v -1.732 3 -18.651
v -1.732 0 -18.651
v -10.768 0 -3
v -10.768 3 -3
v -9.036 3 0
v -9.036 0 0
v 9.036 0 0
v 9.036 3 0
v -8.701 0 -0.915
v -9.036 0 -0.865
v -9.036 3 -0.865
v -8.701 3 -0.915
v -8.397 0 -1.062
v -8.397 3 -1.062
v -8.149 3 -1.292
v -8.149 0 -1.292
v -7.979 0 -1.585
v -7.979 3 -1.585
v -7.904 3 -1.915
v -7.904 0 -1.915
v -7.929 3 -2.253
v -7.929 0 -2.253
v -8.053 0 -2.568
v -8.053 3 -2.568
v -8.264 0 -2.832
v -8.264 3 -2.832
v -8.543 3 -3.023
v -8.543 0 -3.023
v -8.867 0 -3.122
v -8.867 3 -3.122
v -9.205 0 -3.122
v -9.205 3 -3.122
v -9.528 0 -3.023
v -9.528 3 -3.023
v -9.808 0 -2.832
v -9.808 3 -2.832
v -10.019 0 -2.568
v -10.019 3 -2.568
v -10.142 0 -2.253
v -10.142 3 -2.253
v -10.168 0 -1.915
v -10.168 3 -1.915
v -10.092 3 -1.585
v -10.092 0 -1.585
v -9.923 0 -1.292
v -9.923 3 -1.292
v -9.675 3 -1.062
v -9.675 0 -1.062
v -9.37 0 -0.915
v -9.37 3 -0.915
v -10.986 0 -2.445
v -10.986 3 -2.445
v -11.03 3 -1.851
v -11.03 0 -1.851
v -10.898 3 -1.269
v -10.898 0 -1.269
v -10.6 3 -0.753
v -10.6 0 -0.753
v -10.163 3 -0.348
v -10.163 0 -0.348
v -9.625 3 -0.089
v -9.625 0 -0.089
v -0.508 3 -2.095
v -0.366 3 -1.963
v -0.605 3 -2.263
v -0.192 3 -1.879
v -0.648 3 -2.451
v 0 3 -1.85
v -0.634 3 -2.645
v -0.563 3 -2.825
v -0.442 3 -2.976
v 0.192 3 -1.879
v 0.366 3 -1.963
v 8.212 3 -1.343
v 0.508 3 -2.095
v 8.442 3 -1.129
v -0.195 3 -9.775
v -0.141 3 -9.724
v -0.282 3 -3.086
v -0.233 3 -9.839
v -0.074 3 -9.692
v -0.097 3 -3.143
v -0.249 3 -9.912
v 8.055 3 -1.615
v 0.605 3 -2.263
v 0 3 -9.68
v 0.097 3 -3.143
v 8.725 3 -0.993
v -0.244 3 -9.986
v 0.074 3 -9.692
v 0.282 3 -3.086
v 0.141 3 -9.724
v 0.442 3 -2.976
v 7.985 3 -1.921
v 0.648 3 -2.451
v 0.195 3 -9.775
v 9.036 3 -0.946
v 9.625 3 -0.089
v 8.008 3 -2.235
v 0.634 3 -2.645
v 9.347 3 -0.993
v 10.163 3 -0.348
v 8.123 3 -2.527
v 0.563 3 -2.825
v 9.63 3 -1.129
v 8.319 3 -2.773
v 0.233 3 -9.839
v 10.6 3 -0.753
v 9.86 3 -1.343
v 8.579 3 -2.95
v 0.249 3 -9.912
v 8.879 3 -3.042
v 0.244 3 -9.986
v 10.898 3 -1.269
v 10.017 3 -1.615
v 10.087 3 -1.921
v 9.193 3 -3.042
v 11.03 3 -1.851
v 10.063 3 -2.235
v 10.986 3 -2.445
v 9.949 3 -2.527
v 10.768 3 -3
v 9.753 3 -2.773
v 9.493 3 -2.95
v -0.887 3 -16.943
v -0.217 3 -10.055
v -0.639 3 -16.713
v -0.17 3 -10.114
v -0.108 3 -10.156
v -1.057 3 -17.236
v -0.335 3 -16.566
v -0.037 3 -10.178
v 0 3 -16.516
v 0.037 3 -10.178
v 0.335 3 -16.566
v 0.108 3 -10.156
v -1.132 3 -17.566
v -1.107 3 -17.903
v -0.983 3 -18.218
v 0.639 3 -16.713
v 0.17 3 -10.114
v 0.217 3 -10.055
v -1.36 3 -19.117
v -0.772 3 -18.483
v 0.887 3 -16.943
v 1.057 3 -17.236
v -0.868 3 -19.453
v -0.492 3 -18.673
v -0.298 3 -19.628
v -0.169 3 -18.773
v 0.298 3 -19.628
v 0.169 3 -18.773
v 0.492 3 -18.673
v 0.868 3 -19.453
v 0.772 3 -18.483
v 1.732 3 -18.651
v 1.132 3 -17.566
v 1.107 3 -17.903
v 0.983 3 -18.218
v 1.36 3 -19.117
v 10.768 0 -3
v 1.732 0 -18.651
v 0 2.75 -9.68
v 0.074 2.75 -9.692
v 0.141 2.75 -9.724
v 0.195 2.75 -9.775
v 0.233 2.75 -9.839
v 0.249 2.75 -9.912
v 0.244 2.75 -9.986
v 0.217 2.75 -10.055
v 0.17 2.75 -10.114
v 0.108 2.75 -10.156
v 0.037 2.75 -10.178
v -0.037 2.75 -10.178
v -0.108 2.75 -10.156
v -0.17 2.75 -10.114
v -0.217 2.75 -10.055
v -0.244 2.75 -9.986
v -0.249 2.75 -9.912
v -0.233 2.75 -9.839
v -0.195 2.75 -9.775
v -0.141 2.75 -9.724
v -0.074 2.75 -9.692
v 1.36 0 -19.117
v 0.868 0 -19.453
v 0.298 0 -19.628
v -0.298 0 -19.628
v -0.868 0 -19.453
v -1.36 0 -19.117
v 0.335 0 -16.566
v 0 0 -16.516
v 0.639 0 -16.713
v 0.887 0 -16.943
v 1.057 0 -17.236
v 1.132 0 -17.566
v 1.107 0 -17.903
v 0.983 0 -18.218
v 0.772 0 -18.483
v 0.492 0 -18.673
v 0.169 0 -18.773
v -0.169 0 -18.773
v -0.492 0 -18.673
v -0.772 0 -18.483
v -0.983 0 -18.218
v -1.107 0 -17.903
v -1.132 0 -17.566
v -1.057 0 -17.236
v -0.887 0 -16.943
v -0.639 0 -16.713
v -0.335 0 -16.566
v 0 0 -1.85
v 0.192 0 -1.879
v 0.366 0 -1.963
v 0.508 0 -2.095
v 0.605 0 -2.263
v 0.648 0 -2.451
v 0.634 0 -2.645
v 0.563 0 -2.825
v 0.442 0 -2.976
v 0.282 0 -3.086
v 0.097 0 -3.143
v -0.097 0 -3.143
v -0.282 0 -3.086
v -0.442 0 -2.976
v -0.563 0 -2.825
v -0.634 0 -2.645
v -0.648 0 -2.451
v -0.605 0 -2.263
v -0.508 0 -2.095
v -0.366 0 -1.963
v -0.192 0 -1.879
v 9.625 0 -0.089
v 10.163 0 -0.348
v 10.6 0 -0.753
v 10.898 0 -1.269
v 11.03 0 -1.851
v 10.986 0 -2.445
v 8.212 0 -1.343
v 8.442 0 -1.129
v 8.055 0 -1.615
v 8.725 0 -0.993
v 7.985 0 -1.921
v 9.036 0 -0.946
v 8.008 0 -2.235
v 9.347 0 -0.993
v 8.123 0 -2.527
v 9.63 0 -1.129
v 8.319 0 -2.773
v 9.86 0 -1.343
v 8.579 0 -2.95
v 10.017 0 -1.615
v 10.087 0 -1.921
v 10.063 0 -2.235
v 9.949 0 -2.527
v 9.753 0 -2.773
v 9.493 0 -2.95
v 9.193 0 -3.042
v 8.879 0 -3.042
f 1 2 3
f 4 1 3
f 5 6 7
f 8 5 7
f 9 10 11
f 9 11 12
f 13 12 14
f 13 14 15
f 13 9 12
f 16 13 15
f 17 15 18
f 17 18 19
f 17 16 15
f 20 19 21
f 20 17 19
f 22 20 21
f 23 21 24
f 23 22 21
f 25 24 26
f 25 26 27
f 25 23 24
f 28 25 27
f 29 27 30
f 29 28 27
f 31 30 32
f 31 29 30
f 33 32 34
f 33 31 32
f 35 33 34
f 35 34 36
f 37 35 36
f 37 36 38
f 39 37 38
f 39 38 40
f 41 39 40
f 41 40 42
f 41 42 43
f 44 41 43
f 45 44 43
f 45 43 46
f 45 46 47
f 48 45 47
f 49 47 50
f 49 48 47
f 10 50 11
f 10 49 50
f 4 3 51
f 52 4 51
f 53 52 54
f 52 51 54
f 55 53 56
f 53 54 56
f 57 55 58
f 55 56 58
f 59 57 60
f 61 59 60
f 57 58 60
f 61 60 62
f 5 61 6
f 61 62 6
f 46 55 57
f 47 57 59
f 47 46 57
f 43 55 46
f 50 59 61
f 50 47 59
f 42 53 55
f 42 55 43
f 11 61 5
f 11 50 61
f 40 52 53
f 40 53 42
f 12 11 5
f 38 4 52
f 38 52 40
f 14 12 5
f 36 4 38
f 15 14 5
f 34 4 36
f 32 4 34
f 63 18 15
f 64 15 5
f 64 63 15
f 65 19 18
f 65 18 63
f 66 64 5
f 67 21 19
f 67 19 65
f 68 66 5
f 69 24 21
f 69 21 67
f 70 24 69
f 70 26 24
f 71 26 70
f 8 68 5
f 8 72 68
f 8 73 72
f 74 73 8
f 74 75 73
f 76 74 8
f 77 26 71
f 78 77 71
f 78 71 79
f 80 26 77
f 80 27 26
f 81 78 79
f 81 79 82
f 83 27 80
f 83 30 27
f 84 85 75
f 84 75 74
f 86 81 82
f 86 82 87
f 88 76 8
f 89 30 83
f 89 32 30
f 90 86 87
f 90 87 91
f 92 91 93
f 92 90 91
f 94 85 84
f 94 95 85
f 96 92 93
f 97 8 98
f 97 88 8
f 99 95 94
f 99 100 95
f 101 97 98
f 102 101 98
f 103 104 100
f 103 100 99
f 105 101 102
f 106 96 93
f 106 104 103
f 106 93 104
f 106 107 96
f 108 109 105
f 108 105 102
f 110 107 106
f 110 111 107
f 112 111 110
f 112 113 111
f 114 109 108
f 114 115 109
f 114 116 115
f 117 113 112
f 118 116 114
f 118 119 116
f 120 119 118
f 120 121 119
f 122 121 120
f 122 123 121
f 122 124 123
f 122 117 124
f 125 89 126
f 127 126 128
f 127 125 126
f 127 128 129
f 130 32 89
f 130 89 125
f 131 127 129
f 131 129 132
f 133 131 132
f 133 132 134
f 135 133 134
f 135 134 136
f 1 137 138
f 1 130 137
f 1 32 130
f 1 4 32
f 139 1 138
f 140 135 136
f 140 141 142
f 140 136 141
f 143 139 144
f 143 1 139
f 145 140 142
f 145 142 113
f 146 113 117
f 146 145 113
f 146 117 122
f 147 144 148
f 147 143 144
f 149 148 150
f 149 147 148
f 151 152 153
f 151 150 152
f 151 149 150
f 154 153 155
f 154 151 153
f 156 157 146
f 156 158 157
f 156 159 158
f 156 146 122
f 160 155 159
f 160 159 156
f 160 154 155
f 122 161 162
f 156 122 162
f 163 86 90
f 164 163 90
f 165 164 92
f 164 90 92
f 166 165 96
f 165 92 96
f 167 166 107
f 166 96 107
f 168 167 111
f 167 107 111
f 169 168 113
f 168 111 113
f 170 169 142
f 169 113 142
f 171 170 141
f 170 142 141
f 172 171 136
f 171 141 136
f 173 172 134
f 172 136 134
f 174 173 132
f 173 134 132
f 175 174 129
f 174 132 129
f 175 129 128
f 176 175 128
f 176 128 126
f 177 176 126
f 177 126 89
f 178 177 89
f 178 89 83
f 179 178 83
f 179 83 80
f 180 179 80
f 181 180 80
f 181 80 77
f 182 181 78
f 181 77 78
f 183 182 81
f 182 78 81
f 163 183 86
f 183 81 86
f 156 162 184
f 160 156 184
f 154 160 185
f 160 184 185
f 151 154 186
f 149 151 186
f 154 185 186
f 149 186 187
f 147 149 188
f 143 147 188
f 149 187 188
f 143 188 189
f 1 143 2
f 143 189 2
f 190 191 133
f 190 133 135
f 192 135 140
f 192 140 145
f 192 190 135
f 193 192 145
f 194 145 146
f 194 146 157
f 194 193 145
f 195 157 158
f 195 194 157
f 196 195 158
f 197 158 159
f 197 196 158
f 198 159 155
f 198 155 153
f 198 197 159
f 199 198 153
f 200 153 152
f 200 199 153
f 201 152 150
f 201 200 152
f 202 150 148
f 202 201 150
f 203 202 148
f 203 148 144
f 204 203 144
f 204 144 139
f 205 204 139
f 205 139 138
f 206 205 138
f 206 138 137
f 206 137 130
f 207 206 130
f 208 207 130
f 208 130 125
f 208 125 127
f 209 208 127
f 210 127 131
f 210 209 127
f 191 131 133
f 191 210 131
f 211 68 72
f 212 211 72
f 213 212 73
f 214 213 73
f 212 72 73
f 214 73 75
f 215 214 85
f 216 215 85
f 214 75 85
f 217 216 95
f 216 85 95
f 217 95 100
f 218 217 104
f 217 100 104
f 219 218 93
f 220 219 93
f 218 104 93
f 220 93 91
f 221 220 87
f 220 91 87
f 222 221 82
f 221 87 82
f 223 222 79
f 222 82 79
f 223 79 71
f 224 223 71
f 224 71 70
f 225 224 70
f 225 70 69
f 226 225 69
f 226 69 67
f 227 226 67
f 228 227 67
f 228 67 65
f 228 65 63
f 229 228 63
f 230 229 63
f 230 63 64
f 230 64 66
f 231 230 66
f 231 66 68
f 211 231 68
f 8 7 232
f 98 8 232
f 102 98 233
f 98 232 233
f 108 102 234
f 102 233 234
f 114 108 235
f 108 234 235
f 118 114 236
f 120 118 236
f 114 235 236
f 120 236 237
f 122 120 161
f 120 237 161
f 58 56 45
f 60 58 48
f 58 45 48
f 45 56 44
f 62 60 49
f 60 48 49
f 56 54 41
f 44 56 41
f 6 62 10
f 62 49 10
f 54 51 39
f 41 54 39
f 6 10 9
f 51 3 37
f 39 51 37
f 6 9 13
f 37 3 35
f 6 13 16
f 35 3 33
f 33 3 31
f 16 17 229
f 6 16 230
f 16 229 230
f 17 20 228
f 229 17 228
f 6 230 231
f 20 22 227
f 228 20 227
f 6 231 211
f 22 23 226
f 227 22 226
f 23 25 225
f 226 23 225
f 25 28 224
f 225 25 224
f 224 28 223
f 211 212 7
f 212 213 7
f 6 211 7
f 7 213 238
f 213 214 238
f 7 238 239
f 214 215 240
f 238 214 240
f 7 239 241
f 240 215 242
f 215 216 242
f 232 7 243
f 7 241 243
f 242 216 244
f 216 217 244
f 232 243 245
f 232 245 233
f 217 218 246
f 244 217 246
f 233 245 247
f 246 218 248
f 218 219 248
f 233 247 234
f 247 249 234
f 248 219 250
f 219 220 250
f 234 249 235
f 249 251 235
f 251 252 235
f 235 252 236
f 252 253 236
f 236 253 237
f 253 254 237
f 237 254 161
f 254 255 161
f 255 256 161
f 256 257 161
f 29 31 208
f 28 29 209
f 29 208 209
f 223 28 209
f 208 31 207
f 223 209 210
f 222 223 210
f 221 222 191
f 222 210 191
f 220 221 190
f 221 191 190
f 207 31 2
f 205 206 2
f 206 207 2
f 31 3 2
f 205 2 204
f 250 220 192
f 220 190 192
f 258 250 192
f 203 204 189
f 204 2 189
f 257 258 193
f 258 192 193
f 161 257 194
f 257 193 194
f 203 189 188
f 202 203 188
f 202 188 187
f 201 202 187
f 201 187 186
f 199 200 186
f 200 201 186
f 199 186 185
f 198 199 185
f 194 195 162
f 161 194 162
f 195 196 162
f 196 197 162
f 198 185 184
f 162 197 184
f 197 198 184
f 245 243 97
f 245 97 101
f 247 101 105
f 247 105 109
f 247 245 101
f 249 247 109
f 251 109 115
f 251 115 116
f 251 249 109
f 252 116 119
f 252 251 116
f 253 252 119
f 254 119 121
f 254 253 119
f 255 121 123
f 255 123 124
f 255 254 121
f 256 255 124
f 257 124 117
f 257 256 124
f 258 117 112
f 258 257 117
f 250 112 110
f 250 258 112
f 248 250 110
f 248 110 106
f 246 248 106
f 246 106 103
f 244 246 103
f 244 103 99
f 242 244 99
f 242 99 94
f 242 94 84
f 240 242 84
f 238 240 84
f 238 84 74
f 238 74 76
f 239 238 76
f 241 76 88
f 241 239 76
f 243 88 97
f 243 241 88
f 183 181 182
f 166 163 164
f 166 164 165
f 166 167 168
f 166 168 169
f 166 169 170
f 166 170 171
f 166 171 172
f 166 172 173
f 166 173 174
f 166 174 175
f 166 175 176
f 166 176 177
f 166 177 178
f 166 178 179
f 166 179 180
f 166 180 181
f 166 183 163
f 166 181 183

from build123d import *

# Parameters (mm, degrees)
SKETCH1_R           = 1.135
SKETCH1_R_2         = 1.054
BOSS_EXTRUDE1_DEPTH = 3
SKETCH2_R           = 0.65
CUT_EXTRUDE1_DEPTH  = 23.736281859
SKETCH4_R           = 0.25
CUT_EXTRUDE3_DEPTH  = 0.25


with BuildPart() as part:
    # Sketch1 → Boss-Extrude1 (new body)
    with BuildSketch(Plane(origin=(0, 0, 0), x_dir=(1, 0, 0), z_dir=(0, 1, 0))):
        with BuildLine():
            Line((0, 0), (9.035898385, 0))
            ThreePointArc((9.035898385, 0), (10.767949192, 1), (10.767949192, 3))
            Line((10.767949192, 3), (1.732050808, 18.650635095))
            ThreePointArc((1.732050808, 18.650635095), (0, 19.650635095), (-1.732050808, 18.650635095))
            Line((-1.732050808, 18.650635095), (-10.767949192, 3))
            ThreePointArc((-10.767949192, 3), (-10.767949192, 1), (-9.035898385, 0))
            Line((-9.035898385, 0), (0, 0))
        make_face()
        with Locations(Location((0, 17.650635095, 0), (0, 0, 270))):
            Circle(SKETCH1_R, mode=Mode.SUBTRACT)
        with Locations(Location((-9.035898385, 2, 0), (0, 0, 270))):
            Circle(SKETCH1_R, mode=Mode.SUBTRACT)
        with Locations(Location((9.035898385, 2, 0), (0, 0, 270))):
            Circle(SKETCH1_R_2, mode=Mode.SUBTRACT)
    extrude(amount=BOSS_EXTRUDE1_DEPTH)

    # Sketch2 → Cut-Extrude1 (cut, through all)
    with BuildSketch(Plane(origin=(0, 3, 0), x_dir=(1, 0, 0), z_dir=(0, 1, 0))):
        with Locations(Location((0, 2.5, 0), (0, 0, 270))):
            Circle(SKETCH2_R)
    extrude(amount=-CUT_EXTRUDE1_DEPTH, mode=Mode.SUBTRACT)

    # Sketch4 → Cut-Extrude3 (cut)
    with BuildSketch(Plane(origin=(0, 3, 0), x_dir=(1, 0, 0), z_dir=(0, 1, 0))):
        with Locations(Location((0, 9.930442918, 0), (0, 0, 270))):
            Circle(SKETCH4_R)
    extrude(amount=-CUT_EXTRUDE3_DEPTH, mode=Mode.SUBTRACT)


solid = part.part
